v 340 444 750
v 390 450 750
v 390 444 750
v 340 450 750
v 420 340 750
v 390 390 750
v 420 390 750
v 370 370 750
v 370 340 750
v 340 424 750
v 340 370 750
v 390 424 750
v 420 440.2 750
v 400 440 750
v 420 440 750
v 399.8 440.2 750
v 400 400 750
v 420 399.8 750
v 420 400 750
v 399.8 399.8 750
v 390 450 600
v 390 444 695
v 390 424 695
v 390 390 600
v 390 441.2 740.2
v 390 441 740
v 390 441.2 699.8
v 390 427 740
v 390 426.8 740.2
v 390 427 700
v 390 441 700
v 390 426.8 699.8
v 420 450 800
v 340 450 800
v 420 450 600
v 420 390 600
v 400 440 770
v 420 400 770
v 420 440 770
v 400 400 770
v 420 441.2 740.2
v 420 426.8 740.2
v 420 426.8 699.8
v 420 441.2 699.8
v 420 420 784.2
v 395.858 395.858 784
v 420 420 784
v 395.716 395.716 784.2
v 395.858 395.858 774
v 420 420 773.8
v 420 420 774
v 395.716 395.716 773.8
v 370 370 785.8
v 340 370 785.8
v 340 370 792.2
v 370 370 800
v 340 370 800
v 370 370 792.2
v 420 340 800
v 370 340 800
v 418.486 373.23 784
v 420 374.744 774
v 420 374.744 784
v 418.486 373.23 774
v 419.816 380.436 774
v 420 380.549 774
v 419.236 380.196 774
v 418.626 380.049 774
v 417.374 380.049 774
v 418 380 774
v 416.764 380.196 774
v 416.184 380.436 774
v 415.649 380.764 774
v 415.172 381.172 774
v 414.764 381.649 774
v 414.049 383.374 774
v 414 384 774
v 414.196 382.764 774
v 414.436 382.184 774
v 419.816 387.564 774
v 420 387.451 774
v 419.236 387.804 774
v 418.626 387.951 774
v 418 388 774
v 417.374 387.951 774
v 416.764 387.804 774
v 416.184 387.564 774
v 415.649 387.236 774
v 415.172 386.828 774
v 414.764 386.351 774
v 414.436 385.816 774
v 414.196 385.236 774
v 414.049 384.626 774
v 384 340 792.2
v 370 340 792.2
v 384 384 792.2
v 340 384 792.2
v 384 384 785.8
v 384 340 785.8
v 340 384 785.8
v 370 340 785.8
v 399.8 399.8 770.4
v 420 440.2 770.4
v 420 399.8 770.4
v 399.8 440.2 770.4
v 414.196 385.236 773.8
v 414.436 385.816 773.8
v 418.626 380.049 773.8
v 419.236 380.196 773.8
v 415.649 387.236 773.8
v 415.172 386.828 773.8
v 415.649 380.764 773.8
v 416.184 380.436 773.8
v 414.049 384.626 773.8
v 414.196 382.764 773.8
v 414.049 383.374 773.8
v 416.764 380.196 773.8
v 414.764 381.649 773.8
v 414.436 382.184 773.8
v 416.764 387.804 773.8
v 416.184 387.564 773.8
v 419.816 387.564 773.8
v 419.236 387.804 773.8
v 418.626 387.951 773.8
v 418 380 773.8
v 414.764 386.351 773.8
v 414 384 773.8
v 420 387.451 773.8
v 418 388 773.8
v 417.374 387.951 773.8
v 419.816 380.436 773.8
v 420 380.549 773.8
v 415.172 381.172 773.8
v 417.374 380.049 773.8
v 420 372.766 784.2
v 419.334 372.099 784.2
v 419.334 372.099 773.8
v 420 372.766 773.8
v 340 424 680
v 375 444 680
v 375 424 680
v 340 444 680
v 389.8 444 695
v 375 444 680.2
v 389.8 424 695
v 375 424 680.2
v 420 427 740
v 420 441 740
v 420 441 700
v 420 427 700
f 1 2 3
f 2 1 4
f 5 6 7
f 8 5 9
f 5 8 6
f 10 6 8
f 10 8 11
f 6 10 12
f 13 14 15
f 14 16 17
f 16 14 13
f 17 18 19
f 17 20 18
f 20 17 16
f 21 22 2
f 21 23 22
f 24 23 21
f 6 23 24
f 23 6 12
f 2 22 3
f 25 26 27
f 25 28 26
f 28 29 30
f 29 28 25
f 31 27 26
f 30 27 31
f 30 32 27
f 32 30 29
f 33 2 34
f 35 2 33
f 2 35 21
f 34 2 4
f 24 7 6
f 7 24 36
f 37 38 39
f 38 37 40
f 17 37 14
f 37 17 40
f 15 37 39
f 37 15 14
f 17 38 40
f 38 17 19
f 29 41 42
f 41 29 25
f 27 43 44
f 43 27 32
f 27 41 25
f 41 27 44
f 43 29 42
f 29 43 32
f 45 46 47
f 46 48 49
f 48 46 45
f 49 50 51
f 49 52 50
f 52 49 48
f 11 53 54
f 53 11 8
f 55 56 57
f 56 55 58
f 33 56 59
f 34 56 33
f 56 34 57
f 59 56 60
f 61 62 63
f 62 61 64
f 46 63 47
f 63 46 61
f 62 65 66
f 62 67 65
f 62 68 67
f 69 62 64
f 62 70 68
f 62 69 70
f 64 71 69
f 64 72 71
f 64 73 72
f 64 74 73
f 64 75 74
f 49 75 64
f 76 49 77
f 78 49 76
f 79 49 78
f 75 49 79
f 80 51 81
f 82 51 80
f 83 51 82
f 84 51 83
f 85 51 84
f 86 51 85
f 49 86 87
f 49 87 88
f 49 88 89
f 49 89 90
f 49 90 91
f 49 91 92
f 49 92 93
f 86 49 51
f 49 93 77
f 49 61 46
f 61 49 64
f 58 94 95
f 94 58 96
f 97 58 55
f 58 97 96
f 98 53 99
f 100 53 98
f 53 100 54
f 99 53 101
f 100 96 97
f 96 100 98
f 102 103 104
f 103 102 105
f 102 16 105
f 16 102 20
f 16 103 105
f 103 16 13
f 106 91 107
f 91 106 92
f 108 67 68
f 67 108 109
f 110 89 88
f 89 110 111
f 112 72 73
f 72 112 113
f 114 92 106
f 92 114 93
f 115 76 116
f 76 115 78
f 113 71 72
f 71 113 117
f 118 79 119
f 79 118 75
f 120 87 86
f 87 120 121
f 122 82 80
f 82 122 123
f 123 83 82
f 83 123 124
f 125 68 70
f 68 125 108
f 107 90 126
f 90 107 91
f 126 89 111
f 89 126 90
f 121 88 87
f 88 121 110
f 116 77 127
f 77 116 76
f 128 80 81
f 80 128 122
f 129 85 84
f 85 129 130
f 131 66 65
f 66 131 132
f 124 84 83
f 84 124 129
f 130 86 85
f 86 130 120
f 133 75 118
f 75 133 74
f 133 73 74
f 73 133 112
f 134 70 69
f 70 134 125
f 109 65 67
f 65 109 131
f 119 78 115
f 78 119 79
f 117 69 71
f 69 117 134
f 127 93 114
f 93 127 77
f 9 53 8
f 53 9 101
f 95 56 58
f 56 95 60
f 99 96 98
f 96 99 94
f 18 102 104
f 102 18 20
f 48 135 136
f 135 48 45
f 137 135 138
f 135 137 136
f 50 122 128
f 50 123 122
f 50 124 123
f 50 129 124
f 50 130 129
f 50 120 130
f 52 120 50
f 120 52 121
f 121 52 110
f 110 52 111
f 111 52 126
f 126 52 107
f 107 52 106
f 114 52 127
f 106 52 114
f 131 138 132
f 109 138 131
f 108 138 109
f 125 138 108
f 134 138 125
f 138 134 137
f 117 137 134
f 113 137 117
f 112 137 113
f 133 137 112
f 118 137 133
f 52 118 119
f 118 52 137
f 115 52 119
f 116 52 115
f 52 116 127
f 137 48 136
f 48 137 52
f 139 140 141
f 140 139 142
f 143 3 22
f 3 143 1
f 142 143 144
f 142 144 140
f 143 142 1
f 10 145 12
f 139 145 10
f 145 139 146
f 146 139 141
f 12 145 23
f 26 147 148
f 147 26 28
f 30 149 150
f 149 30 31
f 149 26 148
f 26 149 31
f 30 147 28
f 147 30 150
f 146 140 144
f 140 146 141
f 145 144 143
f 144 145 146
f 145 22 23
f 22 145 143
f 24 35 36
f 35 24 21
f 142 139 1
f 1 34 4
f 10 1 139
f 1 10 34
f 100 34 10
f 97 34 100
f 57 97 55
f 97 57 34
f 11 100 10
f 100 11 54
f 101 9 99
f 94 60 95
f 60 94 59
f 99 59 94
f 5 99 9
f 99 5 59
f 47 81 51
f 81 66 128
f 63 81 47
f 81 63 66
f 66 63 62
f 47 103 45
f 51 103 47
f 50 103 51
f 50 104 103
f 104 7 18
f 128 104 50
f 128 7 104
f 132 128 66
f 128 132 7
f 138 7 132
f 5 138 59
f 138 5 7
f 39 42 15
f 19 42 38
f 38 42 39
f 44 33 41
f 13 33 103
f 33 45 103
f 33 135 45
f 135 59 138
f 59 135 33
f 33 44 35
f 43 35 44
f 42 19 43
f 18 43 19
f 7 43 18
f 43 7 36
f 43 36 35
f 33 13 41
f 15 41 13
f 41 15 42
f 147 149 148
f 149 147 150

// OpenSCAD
// file: parts.scad
$fn=40;

// ---- 桌腿 ----

module leg(){
  difference(){
    union(){
      translate([390.000,390.000,0.000]) cube([60.000,60.000,750.000]);
      translate([400.000,400.000,750.000]) cube([40.000,40.000,20.000]);
    }
    // 牙板透榫槽（沿 +x，+y 侧牙板 A 端穿入）
    translate([389.000,426.800,699.800]) cube([62.000,14.400,40.400]);
    // 牙板闷榫槽（沿 +y，+x 侧牙板 B 端）
    translate([426.800,389.000,699.800]) cube([14.400,23.200,40.400]);
  }
}

// ---- 边框 ----

module rail(){
  difference(){
    union(){
      translate([0,0,750]) linear_extrude(height=50) polygon(points=[[-370,370],[370,370],[450.0,450.0],[-450.0,450.0]]);
      translate([420.607,399.393,779.0]) rotate([0,0,-45]) cube([34,40,10],center=true);
    }
    // 面板槽：全长开通至 45° 端面（角部两框的槽合起来成 L 形）
    translate([-450.000,370.000,785.800]) cube([900.000,14.000,6.400]);
    // 腿顶榫卯（两端各半，合起来 40x40x20）
    translate([399.800,399.800,750.000]) cube([40.400,40.400,20.400]);
    translate([-440.200,399.800,750.000]) cube([40.400,40.400,20.400]);
    // 格角暗榫卯
    translate([-398.545,421.455,779.0]) rotate([0,0,45]) cube([34.4,40.4,10.4],center=true);
    // 竹销孔：+x 端穿暗榫，-x 端穿本体
    translate([418,384,750]) cylinder(h=34,r=4.0,$fn=40);
    translate([-384,418,750]) cylinder(h=34,r=4.0,$fn=40);
  }
}

// ---- 牙板 ----

module apron(){
  difference(){
    union(){
      translate([-390.000,424.000,680.000]) cube([780.000,20.000,70.000]);
      // A 端：透榫（390..460）
      translate([390.000,427.000,700.000]) cube([70.000,14.000,40.000]);
      // B 端：闷榫（-412..-390）
      translate([-412.000,427.000,700.000]) cube([22.000,14.000,40.000]);
    }
    hull(){ translate([375.000,423.500,680.000]) cube([15.000,21.000,0.200]); translate([389.800,423.500,680.000]) cube([0.200,21.000,15.000]); }
    hull(){ translate([-390.000,423.500,680.000]) cube([15.000,21.000,0.200]); translate([-390.000,423.500,680.000]) cube([0.200,21.000,15.000]); }
    // 透榫楔槽（横槽，撑开榫头上下两片）
    translate([428.000,426.900,718.400]) cube([32.200,14.200,3.200]);
  }
}

// ---- 面板-边板 ----

module panel_outer(){
  difference(){
    union(){
      translate([-365.000,-365.000,778.000]) cube([730.000,244.000,22.000]);
      translate([0,0,786]) linear_extrude(height=6) polygon(points=[[-379,-121],[-379,-377],[-377,-379],[377,-379],[379,-377],[379,-121],[365,-121],[365,-365],[-365,-365],[-365,-121]]);
    }
    // 内侧龙凤榫槽（向板内 8 深：y -129..-121）
    translate([-365.000,-129.000,785.800]) cube([730.000,8.000,6.400]);
    // 穿带燕尾槽
    hull(){ translate([-259.200,-365.000,778.000]) cube([30.400,244.000,0.100]); translate([-266.200,-365.000,783.900]) cube([44.400,244.000,0.100]); }
    hull(){ translate([-15.200,-365.000,778.000]) cube([30.400,244.000,0.100]); translate([-22.200,-365.000,783.900]) cube([44.400,244.000,0.100]); }
    hull(){ translate([228.800,-365.000,778.000]) cube([30.400,244.000,0.100]); translate([221.800,-365.000,783.900]) cube([44.400,244.000,0.100]); }
  }
}

// ---- 面板-中板 ----

module panel_middle(){
  difference(){
    union(){
      translate([-365.000,-121.000,778.000]) cube([730.000,242.000,22.000]);
      translate([365.000,-121.000,786.000]) cube([14.000,242.000,6.000]);
      translate([-379.000,-121.000,786.000]) cube([14.000,242.000,6.000]);
    }
    // 两侧龙凤榫槽（各向板内 8 深）
    translate([-365.000,-121.000,785.800]) cube([730.000,8.000,6.400]);
    translate([-365.000,113.000,785.800]) cube([730.000,8.000,6.400]);
    hull(){ translate([-259.200,-121.000,778.000]) cube([30.400,242.000,0.100]); translate([-266.200,-121.000,783.900]) cube([44.400,242.000,0.100]); }
    hull(){ translate([-15.200,-121.000,778.000]) cube([30.400,242.000,0.100]); translate([-22.200,-121.000,783.900]) cube([44.400,242.000,0.100]); }
    hull(){ translate([228.800,-121.000,778.000]) cube([30.400,242.000,0.100]); translate([221.800,-121.000,783.900]) cube([44.400,242.000,0.100]); }
  }
}

// ---- 穿带 ----

module cleat(){
  union(){
    translate([-20.000,-363.000,752.000]) cube([40.000,726.000,26.000]);
    hull(){
      translate([-15.000,-363.000,777.900]) cube([30.000,726.000,0.050]);
      translate([-22.000,-363.000,783.800]) cube([44.000,726.000,0.100]);
    }
  }
}

// ---- 穿簧 ----
module spline(){ translate([-360.000,-7.800,786.100]) cube([720.000,15.600,5.800]); }
// ---- 木楔 ----
module wedge(){ hull(){ translate([435.000,427.400,719.400]) cube([1.000,13.200,1.200]); translate([467.000,427.400,718.500]) cube([1.000,13.200,3.000]); } }
// ---- 竹销 ----
module pin(){ translate([0,0,750]) cylinder(h=34,r=4.0,$fn=40); }
// main file
include <parts.scad>
difference(){
 intersection(){
  union(){
color([0.42,0.28,0.16]) translate([0,0,0]) rotate([0,0,0]) leg();color([0.54,0.37,0.21]) translate([0,0,0]) rotate([0,0,0]) rail();color([0.54,0.37,0.21]) translate([0,0,0]) rotate([0,0,270]) rail();color([0.49,0.33,0.19]) translate([0,0,0]) rotate([0,0,0]) apron();color([0.49,0.33,0.19]) translate([0,0,0]) rotate([0,0,270]) apron();color([0.30,0.19,0.10]) translate([0,0,0]) rotate([0,0,0]) wedge();color([0.86,0.80,0.55]) translate([418,384,0]) rotate([0,0,0]) pin();
  }
  translate([340,340,600]) cube([140,170,230]);
 }
 translate([420,300,590]) cube([300,300,260]);
}
